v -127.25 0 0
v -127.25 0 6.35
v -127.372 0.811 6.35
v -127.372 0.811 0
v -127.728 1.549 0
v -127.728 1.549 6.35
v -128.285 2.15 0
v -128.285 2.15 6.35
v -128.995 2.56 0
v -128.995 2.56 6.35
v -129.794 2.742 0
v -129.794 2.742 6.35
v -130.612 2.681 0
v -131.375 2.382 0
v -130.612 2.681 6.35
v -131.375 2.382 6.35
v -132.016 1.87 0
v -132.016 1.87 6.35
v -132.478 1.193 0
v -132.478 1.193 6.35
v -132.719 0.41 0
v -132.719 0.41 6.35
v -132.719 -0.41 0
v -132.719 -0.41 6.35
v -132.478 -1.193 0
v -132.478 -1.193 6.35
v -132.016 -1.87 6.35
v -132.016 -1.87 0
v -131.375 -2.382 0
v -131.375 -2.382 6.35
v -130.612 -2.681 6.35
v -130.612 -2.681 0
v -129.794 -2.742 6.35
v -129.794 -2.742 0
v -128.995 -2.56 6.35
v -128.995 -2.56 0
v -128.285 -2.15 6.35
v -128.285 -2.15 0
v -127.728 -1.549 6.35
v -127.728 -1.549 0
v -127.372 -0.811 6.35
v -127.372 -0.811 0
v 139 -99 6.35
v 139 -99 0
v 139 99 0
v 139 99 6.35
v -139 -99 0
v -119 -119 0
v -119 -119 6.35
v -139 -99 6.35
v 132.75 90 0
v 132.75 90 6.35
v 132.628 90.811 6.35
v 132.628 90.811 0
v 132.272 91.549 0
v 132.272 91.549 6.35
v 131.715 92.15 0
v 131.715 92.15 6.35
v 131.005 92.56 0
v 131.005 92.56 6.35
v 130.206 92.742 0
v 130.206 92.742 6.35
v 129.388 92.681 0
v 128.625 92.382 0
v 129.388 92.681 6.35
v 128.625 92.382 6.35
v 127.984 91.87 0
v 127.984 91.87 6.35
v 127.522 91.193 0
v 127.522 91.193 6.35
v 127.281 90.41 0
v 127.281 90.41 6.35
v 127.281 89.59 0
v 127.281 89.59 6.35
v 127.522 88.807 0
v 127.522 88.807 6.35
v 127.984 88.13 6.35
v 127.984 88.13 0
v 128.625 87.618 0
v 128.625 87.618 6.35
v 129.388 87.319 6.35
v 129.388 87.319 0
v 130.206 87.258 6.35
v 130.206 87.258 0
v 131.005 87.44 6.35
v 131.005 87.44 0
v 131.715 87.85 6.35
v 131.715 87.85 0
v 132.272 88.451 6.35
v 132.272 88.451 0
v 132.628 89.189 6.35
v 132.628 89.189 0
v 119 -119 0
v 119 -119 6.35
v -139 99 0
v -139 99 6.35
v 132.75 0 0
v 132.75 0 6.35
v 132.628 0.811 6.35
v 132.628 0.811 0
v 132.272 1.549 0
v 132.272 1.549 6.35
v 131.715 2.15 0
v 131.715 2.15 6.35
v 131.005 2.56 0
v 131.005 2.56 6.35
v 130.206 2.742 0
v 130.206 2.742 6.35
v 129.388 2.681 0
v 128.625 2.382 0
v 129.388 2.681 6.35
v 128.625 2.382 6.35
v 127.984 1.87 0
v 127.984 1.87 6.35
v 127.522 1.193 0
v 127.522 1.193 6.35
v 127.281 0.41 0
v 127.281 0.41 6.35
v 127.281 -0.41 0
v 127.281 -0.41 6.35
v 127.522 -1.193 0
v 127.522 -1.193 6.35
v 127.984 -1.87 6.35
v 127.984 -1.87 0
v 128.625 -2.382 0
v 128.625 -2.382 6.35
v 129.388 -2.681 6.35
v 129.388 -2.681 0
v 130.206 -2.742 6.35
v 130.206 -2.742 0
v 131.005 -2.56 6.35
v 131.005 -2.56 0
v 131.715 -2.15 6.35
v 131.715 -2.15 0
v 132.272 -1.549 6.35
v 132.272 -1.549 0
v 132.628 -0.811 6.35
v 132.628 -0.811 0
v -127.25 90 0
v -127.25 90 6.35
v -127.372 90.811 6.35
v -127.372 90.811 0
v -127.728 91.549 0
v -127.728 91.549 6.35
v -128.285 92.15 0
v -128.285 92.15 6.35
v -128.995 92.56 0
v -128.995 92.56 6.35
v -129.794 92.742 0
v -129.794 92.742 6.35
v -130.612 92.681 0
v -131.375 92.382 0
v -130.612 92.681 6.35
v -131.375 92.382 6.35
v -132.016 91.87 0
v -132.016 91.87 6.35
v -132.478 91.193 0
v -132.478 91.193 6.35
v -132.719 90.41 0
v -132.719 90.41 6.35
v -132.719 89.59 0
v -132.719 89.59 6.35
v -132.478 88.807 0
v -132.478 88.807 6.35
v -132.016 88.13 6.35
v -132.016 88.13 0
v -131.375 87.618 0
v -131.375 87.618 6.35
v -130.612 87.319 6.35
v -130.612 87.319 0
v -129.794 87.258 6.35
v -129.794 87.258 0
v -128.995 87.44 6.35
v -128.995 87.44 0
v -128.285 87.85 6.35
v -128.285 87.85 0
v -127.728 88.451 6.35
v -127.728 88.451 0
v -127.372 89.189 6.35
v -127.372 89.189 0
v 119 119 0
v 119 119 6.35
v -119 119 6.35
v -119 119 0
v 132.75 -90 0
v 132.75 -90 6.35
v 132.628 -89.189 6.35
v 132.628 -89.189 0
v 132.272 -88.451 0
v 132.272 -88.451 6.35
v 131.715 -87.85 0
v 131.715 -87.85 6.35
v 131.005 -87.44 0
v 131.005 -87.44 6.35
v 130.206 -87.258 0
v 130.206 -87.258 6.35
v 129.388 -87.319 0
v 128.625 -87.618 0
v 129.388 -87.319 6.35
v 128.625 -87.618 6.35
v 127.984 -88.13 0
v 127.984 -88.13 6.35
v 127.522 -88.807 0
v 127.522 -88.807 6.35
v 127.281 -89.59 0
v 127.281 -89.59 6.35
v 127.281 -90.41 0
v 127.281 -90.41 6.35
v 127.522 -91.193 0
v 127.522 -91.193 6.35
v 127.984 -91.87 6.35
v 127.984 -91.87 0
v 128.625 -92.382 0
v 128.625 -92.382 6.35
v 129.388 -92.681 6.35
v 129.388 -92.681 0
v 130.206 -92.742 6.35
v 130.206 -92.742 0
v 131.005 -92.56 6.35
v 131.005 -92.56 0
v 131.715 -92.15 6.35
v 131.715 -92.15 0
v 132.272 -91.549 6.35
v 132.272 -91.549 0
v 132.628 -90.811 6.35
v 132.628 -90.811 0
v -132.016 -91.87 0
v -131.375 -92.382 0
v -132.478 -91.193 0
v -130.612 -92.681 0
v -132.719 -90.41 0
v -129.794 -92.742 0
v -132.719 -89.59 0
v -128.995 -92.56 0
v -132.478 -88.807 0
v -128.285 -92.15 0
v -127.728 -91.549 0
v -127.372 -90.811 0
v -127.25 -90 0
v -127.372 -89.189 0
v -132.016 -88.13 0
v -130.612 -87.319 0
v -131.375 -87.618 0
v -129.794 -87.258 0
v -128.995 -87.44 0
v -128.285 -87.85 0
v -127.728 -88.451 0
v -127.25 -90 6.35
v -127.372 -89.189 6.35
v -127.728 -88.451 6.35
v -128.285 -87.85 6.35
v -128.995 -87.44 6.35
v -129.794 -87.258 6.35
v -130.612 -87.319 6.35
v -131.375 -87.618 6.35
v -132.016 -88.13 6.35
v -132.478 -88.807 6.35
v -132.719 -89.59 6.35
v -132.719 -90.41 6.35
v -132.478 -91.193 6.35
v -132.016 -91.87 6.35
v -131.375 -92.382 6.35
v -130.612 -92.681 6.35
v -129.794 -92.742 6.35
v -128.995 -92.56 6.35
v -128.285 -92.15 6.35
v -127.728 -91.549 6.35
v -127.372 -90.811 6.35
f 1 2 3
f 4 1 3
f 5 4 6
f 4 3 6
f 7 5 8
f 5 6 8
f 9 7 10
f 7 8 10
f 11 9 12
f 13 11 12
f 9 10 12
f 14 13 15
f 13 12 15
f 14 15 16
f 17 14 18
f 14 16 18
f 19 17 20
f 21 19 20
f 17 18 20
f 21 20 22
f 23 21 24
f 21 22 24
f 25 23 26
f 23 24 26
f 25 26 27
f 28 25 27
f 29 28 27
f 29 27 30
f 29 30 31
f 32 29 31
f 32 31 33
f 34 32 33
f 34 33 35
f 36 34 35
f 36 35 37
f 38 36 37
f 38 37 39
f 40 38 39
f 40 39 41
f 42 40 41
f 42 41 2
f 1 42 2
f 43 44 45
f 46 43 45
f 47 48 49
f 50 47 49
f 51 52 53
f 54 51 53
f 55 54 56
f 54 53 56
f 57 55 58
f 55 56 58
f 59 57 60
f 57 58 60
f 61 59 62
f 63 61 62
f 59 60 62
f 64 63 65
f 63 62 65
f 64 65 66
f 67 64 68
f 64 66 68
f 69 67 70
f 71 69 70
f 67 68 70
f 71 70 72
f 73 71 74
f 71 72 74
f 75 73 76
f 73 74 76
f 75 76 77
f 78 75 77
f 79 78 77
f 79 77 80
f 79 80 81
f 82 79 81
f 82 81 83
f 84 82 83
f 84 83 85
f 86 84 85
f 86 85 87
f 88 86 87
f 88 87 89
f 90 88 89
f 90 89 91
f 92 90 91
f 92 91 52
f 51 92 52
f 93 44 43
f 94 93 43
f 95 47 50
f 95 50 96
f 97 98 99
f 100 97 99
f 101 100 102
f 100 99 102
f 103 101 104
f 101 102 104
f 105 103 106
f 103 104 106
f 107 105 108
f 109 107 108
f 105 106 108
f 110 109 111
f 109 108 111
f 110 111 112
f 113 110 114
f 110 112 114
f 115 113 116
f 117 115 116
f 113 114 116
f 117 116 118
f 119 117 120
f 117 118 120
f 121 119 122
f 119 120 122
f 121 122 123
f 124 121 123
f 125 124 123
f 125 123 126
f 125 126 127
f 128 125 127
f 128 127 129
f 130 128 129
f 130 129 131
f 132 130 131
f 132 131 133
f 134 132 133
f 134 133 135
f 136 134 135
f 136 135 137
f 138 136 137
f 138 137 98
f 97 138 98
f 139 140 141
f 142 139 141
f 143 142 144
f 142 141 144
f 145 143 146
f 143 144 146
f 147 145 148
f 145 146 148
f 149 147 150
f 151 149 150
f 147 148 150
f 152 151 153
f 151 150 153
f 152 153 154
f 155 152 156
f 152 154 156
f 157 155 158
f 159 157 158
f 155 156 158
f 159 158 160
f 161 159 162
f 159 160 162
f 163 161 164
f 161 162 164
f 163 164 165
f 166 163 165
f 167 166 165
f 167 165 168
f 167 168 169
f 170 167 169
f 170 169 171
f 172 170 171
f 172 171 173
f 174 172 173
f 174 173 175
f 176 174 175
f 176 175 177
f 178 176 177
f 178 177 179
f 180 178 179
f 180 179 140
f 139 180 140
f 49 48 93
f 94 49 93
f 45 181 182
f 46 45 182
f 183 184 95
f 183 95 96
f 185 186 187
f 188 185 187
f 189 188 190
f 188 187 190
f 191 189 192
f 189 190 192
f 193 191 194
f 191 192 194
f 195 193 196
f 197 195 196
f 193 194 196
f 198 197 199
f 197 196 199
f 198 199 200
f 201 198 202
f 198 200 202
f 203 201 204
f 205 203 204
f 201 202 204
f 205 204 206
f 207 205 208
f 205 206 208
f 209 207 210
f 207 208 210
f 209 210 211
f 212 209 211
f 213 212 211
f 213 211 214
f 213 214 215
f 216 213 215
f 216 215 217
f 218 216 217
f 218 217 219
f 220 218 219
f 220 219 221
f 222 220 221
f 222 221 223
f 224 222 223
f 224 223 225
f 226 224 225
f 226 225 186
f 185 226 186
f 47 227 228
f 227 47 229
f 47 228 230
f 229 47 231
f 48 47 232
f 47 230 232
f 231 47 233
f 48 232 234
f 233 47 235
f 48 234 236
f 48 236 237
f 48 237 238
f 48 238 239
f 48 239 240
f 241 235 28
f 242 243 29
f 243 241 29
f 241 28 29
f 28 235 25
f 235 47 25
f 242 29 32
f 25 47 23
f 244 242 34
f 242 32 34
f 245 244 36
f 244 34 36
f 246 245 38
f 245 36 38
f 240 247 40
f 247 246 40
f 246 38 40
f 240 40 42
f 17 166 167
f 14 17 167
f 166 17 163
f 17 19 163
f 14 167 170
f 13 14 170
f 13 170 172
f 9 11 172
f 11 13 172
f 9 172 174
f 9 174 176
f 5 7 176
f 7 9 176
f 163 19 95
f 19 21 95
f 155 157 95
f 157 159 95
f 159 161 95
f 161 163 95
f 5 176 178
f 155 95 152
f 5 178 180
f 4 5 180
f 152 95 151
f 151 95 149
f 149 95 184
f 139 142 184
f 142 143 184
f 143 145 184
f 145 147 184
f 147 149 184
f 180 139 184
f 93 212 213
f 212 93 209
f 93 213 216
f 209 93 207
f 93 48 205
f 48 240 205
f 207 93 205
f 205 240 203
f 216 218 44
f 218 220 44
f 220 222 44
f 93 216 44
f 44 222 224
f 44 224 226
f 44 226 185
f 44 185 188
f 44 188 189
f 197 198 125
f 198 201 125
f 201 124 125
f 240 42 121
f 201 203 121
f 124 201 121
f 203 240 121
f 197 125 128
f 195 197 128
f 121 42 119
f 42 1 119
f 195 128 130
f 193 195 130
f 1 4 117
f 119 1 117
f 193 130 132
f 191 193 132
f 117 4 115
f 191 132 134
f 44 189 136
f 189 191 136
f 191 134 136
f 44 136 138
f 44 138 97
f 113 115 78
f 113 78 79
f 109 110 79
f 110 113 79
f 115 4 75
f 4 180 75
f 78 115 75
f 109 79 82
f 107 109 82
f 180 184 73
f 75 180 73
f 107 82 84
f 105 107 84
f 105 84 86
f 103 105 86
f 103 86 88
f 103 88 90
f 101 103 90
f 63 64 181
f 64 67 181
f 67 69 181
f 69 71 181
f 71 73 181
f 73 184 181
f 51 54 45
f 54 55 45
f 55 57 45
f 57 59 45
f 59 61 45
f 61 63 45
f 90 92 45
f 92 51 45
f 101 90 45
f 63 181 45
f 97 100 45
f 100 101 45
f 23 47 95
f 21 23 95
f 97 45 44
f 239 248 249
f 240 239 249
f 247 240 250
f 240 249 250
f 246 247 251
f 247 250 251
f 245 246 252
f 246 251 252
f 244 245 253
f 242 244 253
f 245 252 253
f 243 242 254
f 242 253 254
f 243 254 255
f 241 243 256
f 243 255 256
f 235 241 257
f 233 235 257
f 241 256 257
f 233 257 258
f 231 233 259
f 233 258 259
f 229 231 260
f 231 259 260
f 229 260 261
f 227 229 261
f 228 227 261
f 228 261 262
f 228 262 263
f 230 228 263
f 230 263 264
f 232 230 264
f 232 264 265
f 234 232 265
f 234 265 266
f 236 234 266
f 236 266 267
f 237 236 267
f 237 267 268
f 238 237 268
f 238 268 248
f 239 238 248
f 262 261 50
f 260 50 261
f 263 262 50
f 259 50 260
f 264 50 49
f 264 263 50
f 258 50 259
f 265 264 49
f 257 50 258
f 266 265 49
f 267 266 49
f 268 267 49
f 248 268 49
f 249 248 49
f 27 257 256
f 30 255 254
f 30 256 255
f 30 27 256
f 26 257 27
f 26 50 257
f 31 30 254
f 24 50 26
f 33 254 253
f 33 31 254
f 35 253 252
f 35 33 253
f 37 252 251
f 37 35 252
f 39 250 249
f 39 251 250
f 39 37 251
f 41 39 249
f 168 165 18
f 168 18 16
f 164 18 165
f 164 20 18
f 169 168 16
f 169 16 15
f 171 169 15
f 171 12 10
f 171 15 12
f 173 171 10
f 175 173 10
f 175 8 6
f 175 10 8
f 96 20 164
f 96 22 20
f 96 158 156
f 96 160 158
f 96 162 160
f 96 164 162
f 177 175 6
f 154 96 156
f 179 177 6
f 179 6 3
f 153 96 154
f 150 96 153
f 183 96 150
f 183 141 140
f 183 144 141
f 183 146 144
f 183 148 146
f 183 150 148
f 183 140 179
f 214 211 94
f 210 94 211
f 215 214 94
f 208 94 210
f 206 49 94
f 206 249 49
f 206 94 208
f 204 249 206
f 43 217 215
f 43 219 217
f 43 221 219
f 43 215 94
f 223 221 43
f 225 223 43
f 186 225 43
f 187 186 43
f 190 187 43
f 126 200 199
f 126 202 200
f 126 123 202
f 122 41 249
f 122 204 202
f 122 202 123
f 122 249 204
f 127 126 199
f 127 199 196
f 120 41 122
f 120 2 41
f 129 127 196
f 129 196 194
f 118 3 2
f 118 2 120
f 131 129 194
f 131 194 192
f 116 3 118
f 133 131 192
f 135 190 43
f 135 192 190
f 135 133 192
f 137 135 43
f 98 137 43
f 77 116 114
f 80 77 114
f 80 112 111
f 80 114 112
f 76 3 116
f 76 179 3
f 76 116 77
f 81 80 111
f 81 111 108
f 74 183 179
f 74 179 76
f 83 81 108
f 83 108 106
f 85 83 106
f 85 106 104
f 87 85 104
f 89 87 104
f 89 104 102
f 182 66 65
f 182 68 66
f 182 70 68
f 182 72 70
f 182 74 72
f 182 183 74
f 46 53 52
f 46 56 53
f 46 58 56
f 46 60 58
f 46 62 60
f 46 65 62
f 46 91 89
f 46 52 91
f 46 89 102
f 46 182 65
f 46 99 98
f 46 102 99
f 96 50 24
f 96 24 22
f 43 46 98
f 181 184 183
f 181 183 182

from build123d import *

# Parameters (mm, degrees)
SKETCH1_W           = 278
SKETCH1_H           = 238
BOSS_EXTRUDE1_DEPTH = 6.35
CHAMFER1_SIZE       = 20
SKETCH4_R           = 2.75
CUT_EXTRUDE2_DEPTH  = 76.2


with BuildPart() as part:
    # Sketch1 → Boss-Extrude1 (new body)
    with BuildSketch(Plane.XY):
        Rectangle(SKETCH1_W, SKETCH1_H)
    extrude(amount=BOSS_EXTRUDE1_DEPTH)

    # Chamfer1
    chamfer1_edges = [part.edges().sort_by_distance(p)[0] for p in [
        (-139, 119, 3.175),
        (139, 119, 3.175),
        (139, -119, 3.175),
        (-139, -119, 3.175),
    ]]
    chamfer(chamfer1_edges, length=CHAMFER1_SIZE)

    # Sketch4 → Cut-Extrude2 (cut)
    with BuildSketch(Plane.XY.offset(6.35)):
        with Locations((-130, 90)):
            Circle(SKETCH4_R)
        with Locations((-130, -90)):
            Circle(SKETCH4_R)
        with Locations((-130, 0)):
            Circle(SKETCH4_R)
        with Locations((130, -90)):
            Circle(SKETCH4_R)
        with Locations((130, 0)):
            Circle(SKETCH4_R)
        with Locations((130, 90)):
            Circle(SKETCH4_R)
    extrude(amount=-CUT_EXTRUDE2_DEPTH, mode=Mode.SUBTRACT)


solid = part.part
